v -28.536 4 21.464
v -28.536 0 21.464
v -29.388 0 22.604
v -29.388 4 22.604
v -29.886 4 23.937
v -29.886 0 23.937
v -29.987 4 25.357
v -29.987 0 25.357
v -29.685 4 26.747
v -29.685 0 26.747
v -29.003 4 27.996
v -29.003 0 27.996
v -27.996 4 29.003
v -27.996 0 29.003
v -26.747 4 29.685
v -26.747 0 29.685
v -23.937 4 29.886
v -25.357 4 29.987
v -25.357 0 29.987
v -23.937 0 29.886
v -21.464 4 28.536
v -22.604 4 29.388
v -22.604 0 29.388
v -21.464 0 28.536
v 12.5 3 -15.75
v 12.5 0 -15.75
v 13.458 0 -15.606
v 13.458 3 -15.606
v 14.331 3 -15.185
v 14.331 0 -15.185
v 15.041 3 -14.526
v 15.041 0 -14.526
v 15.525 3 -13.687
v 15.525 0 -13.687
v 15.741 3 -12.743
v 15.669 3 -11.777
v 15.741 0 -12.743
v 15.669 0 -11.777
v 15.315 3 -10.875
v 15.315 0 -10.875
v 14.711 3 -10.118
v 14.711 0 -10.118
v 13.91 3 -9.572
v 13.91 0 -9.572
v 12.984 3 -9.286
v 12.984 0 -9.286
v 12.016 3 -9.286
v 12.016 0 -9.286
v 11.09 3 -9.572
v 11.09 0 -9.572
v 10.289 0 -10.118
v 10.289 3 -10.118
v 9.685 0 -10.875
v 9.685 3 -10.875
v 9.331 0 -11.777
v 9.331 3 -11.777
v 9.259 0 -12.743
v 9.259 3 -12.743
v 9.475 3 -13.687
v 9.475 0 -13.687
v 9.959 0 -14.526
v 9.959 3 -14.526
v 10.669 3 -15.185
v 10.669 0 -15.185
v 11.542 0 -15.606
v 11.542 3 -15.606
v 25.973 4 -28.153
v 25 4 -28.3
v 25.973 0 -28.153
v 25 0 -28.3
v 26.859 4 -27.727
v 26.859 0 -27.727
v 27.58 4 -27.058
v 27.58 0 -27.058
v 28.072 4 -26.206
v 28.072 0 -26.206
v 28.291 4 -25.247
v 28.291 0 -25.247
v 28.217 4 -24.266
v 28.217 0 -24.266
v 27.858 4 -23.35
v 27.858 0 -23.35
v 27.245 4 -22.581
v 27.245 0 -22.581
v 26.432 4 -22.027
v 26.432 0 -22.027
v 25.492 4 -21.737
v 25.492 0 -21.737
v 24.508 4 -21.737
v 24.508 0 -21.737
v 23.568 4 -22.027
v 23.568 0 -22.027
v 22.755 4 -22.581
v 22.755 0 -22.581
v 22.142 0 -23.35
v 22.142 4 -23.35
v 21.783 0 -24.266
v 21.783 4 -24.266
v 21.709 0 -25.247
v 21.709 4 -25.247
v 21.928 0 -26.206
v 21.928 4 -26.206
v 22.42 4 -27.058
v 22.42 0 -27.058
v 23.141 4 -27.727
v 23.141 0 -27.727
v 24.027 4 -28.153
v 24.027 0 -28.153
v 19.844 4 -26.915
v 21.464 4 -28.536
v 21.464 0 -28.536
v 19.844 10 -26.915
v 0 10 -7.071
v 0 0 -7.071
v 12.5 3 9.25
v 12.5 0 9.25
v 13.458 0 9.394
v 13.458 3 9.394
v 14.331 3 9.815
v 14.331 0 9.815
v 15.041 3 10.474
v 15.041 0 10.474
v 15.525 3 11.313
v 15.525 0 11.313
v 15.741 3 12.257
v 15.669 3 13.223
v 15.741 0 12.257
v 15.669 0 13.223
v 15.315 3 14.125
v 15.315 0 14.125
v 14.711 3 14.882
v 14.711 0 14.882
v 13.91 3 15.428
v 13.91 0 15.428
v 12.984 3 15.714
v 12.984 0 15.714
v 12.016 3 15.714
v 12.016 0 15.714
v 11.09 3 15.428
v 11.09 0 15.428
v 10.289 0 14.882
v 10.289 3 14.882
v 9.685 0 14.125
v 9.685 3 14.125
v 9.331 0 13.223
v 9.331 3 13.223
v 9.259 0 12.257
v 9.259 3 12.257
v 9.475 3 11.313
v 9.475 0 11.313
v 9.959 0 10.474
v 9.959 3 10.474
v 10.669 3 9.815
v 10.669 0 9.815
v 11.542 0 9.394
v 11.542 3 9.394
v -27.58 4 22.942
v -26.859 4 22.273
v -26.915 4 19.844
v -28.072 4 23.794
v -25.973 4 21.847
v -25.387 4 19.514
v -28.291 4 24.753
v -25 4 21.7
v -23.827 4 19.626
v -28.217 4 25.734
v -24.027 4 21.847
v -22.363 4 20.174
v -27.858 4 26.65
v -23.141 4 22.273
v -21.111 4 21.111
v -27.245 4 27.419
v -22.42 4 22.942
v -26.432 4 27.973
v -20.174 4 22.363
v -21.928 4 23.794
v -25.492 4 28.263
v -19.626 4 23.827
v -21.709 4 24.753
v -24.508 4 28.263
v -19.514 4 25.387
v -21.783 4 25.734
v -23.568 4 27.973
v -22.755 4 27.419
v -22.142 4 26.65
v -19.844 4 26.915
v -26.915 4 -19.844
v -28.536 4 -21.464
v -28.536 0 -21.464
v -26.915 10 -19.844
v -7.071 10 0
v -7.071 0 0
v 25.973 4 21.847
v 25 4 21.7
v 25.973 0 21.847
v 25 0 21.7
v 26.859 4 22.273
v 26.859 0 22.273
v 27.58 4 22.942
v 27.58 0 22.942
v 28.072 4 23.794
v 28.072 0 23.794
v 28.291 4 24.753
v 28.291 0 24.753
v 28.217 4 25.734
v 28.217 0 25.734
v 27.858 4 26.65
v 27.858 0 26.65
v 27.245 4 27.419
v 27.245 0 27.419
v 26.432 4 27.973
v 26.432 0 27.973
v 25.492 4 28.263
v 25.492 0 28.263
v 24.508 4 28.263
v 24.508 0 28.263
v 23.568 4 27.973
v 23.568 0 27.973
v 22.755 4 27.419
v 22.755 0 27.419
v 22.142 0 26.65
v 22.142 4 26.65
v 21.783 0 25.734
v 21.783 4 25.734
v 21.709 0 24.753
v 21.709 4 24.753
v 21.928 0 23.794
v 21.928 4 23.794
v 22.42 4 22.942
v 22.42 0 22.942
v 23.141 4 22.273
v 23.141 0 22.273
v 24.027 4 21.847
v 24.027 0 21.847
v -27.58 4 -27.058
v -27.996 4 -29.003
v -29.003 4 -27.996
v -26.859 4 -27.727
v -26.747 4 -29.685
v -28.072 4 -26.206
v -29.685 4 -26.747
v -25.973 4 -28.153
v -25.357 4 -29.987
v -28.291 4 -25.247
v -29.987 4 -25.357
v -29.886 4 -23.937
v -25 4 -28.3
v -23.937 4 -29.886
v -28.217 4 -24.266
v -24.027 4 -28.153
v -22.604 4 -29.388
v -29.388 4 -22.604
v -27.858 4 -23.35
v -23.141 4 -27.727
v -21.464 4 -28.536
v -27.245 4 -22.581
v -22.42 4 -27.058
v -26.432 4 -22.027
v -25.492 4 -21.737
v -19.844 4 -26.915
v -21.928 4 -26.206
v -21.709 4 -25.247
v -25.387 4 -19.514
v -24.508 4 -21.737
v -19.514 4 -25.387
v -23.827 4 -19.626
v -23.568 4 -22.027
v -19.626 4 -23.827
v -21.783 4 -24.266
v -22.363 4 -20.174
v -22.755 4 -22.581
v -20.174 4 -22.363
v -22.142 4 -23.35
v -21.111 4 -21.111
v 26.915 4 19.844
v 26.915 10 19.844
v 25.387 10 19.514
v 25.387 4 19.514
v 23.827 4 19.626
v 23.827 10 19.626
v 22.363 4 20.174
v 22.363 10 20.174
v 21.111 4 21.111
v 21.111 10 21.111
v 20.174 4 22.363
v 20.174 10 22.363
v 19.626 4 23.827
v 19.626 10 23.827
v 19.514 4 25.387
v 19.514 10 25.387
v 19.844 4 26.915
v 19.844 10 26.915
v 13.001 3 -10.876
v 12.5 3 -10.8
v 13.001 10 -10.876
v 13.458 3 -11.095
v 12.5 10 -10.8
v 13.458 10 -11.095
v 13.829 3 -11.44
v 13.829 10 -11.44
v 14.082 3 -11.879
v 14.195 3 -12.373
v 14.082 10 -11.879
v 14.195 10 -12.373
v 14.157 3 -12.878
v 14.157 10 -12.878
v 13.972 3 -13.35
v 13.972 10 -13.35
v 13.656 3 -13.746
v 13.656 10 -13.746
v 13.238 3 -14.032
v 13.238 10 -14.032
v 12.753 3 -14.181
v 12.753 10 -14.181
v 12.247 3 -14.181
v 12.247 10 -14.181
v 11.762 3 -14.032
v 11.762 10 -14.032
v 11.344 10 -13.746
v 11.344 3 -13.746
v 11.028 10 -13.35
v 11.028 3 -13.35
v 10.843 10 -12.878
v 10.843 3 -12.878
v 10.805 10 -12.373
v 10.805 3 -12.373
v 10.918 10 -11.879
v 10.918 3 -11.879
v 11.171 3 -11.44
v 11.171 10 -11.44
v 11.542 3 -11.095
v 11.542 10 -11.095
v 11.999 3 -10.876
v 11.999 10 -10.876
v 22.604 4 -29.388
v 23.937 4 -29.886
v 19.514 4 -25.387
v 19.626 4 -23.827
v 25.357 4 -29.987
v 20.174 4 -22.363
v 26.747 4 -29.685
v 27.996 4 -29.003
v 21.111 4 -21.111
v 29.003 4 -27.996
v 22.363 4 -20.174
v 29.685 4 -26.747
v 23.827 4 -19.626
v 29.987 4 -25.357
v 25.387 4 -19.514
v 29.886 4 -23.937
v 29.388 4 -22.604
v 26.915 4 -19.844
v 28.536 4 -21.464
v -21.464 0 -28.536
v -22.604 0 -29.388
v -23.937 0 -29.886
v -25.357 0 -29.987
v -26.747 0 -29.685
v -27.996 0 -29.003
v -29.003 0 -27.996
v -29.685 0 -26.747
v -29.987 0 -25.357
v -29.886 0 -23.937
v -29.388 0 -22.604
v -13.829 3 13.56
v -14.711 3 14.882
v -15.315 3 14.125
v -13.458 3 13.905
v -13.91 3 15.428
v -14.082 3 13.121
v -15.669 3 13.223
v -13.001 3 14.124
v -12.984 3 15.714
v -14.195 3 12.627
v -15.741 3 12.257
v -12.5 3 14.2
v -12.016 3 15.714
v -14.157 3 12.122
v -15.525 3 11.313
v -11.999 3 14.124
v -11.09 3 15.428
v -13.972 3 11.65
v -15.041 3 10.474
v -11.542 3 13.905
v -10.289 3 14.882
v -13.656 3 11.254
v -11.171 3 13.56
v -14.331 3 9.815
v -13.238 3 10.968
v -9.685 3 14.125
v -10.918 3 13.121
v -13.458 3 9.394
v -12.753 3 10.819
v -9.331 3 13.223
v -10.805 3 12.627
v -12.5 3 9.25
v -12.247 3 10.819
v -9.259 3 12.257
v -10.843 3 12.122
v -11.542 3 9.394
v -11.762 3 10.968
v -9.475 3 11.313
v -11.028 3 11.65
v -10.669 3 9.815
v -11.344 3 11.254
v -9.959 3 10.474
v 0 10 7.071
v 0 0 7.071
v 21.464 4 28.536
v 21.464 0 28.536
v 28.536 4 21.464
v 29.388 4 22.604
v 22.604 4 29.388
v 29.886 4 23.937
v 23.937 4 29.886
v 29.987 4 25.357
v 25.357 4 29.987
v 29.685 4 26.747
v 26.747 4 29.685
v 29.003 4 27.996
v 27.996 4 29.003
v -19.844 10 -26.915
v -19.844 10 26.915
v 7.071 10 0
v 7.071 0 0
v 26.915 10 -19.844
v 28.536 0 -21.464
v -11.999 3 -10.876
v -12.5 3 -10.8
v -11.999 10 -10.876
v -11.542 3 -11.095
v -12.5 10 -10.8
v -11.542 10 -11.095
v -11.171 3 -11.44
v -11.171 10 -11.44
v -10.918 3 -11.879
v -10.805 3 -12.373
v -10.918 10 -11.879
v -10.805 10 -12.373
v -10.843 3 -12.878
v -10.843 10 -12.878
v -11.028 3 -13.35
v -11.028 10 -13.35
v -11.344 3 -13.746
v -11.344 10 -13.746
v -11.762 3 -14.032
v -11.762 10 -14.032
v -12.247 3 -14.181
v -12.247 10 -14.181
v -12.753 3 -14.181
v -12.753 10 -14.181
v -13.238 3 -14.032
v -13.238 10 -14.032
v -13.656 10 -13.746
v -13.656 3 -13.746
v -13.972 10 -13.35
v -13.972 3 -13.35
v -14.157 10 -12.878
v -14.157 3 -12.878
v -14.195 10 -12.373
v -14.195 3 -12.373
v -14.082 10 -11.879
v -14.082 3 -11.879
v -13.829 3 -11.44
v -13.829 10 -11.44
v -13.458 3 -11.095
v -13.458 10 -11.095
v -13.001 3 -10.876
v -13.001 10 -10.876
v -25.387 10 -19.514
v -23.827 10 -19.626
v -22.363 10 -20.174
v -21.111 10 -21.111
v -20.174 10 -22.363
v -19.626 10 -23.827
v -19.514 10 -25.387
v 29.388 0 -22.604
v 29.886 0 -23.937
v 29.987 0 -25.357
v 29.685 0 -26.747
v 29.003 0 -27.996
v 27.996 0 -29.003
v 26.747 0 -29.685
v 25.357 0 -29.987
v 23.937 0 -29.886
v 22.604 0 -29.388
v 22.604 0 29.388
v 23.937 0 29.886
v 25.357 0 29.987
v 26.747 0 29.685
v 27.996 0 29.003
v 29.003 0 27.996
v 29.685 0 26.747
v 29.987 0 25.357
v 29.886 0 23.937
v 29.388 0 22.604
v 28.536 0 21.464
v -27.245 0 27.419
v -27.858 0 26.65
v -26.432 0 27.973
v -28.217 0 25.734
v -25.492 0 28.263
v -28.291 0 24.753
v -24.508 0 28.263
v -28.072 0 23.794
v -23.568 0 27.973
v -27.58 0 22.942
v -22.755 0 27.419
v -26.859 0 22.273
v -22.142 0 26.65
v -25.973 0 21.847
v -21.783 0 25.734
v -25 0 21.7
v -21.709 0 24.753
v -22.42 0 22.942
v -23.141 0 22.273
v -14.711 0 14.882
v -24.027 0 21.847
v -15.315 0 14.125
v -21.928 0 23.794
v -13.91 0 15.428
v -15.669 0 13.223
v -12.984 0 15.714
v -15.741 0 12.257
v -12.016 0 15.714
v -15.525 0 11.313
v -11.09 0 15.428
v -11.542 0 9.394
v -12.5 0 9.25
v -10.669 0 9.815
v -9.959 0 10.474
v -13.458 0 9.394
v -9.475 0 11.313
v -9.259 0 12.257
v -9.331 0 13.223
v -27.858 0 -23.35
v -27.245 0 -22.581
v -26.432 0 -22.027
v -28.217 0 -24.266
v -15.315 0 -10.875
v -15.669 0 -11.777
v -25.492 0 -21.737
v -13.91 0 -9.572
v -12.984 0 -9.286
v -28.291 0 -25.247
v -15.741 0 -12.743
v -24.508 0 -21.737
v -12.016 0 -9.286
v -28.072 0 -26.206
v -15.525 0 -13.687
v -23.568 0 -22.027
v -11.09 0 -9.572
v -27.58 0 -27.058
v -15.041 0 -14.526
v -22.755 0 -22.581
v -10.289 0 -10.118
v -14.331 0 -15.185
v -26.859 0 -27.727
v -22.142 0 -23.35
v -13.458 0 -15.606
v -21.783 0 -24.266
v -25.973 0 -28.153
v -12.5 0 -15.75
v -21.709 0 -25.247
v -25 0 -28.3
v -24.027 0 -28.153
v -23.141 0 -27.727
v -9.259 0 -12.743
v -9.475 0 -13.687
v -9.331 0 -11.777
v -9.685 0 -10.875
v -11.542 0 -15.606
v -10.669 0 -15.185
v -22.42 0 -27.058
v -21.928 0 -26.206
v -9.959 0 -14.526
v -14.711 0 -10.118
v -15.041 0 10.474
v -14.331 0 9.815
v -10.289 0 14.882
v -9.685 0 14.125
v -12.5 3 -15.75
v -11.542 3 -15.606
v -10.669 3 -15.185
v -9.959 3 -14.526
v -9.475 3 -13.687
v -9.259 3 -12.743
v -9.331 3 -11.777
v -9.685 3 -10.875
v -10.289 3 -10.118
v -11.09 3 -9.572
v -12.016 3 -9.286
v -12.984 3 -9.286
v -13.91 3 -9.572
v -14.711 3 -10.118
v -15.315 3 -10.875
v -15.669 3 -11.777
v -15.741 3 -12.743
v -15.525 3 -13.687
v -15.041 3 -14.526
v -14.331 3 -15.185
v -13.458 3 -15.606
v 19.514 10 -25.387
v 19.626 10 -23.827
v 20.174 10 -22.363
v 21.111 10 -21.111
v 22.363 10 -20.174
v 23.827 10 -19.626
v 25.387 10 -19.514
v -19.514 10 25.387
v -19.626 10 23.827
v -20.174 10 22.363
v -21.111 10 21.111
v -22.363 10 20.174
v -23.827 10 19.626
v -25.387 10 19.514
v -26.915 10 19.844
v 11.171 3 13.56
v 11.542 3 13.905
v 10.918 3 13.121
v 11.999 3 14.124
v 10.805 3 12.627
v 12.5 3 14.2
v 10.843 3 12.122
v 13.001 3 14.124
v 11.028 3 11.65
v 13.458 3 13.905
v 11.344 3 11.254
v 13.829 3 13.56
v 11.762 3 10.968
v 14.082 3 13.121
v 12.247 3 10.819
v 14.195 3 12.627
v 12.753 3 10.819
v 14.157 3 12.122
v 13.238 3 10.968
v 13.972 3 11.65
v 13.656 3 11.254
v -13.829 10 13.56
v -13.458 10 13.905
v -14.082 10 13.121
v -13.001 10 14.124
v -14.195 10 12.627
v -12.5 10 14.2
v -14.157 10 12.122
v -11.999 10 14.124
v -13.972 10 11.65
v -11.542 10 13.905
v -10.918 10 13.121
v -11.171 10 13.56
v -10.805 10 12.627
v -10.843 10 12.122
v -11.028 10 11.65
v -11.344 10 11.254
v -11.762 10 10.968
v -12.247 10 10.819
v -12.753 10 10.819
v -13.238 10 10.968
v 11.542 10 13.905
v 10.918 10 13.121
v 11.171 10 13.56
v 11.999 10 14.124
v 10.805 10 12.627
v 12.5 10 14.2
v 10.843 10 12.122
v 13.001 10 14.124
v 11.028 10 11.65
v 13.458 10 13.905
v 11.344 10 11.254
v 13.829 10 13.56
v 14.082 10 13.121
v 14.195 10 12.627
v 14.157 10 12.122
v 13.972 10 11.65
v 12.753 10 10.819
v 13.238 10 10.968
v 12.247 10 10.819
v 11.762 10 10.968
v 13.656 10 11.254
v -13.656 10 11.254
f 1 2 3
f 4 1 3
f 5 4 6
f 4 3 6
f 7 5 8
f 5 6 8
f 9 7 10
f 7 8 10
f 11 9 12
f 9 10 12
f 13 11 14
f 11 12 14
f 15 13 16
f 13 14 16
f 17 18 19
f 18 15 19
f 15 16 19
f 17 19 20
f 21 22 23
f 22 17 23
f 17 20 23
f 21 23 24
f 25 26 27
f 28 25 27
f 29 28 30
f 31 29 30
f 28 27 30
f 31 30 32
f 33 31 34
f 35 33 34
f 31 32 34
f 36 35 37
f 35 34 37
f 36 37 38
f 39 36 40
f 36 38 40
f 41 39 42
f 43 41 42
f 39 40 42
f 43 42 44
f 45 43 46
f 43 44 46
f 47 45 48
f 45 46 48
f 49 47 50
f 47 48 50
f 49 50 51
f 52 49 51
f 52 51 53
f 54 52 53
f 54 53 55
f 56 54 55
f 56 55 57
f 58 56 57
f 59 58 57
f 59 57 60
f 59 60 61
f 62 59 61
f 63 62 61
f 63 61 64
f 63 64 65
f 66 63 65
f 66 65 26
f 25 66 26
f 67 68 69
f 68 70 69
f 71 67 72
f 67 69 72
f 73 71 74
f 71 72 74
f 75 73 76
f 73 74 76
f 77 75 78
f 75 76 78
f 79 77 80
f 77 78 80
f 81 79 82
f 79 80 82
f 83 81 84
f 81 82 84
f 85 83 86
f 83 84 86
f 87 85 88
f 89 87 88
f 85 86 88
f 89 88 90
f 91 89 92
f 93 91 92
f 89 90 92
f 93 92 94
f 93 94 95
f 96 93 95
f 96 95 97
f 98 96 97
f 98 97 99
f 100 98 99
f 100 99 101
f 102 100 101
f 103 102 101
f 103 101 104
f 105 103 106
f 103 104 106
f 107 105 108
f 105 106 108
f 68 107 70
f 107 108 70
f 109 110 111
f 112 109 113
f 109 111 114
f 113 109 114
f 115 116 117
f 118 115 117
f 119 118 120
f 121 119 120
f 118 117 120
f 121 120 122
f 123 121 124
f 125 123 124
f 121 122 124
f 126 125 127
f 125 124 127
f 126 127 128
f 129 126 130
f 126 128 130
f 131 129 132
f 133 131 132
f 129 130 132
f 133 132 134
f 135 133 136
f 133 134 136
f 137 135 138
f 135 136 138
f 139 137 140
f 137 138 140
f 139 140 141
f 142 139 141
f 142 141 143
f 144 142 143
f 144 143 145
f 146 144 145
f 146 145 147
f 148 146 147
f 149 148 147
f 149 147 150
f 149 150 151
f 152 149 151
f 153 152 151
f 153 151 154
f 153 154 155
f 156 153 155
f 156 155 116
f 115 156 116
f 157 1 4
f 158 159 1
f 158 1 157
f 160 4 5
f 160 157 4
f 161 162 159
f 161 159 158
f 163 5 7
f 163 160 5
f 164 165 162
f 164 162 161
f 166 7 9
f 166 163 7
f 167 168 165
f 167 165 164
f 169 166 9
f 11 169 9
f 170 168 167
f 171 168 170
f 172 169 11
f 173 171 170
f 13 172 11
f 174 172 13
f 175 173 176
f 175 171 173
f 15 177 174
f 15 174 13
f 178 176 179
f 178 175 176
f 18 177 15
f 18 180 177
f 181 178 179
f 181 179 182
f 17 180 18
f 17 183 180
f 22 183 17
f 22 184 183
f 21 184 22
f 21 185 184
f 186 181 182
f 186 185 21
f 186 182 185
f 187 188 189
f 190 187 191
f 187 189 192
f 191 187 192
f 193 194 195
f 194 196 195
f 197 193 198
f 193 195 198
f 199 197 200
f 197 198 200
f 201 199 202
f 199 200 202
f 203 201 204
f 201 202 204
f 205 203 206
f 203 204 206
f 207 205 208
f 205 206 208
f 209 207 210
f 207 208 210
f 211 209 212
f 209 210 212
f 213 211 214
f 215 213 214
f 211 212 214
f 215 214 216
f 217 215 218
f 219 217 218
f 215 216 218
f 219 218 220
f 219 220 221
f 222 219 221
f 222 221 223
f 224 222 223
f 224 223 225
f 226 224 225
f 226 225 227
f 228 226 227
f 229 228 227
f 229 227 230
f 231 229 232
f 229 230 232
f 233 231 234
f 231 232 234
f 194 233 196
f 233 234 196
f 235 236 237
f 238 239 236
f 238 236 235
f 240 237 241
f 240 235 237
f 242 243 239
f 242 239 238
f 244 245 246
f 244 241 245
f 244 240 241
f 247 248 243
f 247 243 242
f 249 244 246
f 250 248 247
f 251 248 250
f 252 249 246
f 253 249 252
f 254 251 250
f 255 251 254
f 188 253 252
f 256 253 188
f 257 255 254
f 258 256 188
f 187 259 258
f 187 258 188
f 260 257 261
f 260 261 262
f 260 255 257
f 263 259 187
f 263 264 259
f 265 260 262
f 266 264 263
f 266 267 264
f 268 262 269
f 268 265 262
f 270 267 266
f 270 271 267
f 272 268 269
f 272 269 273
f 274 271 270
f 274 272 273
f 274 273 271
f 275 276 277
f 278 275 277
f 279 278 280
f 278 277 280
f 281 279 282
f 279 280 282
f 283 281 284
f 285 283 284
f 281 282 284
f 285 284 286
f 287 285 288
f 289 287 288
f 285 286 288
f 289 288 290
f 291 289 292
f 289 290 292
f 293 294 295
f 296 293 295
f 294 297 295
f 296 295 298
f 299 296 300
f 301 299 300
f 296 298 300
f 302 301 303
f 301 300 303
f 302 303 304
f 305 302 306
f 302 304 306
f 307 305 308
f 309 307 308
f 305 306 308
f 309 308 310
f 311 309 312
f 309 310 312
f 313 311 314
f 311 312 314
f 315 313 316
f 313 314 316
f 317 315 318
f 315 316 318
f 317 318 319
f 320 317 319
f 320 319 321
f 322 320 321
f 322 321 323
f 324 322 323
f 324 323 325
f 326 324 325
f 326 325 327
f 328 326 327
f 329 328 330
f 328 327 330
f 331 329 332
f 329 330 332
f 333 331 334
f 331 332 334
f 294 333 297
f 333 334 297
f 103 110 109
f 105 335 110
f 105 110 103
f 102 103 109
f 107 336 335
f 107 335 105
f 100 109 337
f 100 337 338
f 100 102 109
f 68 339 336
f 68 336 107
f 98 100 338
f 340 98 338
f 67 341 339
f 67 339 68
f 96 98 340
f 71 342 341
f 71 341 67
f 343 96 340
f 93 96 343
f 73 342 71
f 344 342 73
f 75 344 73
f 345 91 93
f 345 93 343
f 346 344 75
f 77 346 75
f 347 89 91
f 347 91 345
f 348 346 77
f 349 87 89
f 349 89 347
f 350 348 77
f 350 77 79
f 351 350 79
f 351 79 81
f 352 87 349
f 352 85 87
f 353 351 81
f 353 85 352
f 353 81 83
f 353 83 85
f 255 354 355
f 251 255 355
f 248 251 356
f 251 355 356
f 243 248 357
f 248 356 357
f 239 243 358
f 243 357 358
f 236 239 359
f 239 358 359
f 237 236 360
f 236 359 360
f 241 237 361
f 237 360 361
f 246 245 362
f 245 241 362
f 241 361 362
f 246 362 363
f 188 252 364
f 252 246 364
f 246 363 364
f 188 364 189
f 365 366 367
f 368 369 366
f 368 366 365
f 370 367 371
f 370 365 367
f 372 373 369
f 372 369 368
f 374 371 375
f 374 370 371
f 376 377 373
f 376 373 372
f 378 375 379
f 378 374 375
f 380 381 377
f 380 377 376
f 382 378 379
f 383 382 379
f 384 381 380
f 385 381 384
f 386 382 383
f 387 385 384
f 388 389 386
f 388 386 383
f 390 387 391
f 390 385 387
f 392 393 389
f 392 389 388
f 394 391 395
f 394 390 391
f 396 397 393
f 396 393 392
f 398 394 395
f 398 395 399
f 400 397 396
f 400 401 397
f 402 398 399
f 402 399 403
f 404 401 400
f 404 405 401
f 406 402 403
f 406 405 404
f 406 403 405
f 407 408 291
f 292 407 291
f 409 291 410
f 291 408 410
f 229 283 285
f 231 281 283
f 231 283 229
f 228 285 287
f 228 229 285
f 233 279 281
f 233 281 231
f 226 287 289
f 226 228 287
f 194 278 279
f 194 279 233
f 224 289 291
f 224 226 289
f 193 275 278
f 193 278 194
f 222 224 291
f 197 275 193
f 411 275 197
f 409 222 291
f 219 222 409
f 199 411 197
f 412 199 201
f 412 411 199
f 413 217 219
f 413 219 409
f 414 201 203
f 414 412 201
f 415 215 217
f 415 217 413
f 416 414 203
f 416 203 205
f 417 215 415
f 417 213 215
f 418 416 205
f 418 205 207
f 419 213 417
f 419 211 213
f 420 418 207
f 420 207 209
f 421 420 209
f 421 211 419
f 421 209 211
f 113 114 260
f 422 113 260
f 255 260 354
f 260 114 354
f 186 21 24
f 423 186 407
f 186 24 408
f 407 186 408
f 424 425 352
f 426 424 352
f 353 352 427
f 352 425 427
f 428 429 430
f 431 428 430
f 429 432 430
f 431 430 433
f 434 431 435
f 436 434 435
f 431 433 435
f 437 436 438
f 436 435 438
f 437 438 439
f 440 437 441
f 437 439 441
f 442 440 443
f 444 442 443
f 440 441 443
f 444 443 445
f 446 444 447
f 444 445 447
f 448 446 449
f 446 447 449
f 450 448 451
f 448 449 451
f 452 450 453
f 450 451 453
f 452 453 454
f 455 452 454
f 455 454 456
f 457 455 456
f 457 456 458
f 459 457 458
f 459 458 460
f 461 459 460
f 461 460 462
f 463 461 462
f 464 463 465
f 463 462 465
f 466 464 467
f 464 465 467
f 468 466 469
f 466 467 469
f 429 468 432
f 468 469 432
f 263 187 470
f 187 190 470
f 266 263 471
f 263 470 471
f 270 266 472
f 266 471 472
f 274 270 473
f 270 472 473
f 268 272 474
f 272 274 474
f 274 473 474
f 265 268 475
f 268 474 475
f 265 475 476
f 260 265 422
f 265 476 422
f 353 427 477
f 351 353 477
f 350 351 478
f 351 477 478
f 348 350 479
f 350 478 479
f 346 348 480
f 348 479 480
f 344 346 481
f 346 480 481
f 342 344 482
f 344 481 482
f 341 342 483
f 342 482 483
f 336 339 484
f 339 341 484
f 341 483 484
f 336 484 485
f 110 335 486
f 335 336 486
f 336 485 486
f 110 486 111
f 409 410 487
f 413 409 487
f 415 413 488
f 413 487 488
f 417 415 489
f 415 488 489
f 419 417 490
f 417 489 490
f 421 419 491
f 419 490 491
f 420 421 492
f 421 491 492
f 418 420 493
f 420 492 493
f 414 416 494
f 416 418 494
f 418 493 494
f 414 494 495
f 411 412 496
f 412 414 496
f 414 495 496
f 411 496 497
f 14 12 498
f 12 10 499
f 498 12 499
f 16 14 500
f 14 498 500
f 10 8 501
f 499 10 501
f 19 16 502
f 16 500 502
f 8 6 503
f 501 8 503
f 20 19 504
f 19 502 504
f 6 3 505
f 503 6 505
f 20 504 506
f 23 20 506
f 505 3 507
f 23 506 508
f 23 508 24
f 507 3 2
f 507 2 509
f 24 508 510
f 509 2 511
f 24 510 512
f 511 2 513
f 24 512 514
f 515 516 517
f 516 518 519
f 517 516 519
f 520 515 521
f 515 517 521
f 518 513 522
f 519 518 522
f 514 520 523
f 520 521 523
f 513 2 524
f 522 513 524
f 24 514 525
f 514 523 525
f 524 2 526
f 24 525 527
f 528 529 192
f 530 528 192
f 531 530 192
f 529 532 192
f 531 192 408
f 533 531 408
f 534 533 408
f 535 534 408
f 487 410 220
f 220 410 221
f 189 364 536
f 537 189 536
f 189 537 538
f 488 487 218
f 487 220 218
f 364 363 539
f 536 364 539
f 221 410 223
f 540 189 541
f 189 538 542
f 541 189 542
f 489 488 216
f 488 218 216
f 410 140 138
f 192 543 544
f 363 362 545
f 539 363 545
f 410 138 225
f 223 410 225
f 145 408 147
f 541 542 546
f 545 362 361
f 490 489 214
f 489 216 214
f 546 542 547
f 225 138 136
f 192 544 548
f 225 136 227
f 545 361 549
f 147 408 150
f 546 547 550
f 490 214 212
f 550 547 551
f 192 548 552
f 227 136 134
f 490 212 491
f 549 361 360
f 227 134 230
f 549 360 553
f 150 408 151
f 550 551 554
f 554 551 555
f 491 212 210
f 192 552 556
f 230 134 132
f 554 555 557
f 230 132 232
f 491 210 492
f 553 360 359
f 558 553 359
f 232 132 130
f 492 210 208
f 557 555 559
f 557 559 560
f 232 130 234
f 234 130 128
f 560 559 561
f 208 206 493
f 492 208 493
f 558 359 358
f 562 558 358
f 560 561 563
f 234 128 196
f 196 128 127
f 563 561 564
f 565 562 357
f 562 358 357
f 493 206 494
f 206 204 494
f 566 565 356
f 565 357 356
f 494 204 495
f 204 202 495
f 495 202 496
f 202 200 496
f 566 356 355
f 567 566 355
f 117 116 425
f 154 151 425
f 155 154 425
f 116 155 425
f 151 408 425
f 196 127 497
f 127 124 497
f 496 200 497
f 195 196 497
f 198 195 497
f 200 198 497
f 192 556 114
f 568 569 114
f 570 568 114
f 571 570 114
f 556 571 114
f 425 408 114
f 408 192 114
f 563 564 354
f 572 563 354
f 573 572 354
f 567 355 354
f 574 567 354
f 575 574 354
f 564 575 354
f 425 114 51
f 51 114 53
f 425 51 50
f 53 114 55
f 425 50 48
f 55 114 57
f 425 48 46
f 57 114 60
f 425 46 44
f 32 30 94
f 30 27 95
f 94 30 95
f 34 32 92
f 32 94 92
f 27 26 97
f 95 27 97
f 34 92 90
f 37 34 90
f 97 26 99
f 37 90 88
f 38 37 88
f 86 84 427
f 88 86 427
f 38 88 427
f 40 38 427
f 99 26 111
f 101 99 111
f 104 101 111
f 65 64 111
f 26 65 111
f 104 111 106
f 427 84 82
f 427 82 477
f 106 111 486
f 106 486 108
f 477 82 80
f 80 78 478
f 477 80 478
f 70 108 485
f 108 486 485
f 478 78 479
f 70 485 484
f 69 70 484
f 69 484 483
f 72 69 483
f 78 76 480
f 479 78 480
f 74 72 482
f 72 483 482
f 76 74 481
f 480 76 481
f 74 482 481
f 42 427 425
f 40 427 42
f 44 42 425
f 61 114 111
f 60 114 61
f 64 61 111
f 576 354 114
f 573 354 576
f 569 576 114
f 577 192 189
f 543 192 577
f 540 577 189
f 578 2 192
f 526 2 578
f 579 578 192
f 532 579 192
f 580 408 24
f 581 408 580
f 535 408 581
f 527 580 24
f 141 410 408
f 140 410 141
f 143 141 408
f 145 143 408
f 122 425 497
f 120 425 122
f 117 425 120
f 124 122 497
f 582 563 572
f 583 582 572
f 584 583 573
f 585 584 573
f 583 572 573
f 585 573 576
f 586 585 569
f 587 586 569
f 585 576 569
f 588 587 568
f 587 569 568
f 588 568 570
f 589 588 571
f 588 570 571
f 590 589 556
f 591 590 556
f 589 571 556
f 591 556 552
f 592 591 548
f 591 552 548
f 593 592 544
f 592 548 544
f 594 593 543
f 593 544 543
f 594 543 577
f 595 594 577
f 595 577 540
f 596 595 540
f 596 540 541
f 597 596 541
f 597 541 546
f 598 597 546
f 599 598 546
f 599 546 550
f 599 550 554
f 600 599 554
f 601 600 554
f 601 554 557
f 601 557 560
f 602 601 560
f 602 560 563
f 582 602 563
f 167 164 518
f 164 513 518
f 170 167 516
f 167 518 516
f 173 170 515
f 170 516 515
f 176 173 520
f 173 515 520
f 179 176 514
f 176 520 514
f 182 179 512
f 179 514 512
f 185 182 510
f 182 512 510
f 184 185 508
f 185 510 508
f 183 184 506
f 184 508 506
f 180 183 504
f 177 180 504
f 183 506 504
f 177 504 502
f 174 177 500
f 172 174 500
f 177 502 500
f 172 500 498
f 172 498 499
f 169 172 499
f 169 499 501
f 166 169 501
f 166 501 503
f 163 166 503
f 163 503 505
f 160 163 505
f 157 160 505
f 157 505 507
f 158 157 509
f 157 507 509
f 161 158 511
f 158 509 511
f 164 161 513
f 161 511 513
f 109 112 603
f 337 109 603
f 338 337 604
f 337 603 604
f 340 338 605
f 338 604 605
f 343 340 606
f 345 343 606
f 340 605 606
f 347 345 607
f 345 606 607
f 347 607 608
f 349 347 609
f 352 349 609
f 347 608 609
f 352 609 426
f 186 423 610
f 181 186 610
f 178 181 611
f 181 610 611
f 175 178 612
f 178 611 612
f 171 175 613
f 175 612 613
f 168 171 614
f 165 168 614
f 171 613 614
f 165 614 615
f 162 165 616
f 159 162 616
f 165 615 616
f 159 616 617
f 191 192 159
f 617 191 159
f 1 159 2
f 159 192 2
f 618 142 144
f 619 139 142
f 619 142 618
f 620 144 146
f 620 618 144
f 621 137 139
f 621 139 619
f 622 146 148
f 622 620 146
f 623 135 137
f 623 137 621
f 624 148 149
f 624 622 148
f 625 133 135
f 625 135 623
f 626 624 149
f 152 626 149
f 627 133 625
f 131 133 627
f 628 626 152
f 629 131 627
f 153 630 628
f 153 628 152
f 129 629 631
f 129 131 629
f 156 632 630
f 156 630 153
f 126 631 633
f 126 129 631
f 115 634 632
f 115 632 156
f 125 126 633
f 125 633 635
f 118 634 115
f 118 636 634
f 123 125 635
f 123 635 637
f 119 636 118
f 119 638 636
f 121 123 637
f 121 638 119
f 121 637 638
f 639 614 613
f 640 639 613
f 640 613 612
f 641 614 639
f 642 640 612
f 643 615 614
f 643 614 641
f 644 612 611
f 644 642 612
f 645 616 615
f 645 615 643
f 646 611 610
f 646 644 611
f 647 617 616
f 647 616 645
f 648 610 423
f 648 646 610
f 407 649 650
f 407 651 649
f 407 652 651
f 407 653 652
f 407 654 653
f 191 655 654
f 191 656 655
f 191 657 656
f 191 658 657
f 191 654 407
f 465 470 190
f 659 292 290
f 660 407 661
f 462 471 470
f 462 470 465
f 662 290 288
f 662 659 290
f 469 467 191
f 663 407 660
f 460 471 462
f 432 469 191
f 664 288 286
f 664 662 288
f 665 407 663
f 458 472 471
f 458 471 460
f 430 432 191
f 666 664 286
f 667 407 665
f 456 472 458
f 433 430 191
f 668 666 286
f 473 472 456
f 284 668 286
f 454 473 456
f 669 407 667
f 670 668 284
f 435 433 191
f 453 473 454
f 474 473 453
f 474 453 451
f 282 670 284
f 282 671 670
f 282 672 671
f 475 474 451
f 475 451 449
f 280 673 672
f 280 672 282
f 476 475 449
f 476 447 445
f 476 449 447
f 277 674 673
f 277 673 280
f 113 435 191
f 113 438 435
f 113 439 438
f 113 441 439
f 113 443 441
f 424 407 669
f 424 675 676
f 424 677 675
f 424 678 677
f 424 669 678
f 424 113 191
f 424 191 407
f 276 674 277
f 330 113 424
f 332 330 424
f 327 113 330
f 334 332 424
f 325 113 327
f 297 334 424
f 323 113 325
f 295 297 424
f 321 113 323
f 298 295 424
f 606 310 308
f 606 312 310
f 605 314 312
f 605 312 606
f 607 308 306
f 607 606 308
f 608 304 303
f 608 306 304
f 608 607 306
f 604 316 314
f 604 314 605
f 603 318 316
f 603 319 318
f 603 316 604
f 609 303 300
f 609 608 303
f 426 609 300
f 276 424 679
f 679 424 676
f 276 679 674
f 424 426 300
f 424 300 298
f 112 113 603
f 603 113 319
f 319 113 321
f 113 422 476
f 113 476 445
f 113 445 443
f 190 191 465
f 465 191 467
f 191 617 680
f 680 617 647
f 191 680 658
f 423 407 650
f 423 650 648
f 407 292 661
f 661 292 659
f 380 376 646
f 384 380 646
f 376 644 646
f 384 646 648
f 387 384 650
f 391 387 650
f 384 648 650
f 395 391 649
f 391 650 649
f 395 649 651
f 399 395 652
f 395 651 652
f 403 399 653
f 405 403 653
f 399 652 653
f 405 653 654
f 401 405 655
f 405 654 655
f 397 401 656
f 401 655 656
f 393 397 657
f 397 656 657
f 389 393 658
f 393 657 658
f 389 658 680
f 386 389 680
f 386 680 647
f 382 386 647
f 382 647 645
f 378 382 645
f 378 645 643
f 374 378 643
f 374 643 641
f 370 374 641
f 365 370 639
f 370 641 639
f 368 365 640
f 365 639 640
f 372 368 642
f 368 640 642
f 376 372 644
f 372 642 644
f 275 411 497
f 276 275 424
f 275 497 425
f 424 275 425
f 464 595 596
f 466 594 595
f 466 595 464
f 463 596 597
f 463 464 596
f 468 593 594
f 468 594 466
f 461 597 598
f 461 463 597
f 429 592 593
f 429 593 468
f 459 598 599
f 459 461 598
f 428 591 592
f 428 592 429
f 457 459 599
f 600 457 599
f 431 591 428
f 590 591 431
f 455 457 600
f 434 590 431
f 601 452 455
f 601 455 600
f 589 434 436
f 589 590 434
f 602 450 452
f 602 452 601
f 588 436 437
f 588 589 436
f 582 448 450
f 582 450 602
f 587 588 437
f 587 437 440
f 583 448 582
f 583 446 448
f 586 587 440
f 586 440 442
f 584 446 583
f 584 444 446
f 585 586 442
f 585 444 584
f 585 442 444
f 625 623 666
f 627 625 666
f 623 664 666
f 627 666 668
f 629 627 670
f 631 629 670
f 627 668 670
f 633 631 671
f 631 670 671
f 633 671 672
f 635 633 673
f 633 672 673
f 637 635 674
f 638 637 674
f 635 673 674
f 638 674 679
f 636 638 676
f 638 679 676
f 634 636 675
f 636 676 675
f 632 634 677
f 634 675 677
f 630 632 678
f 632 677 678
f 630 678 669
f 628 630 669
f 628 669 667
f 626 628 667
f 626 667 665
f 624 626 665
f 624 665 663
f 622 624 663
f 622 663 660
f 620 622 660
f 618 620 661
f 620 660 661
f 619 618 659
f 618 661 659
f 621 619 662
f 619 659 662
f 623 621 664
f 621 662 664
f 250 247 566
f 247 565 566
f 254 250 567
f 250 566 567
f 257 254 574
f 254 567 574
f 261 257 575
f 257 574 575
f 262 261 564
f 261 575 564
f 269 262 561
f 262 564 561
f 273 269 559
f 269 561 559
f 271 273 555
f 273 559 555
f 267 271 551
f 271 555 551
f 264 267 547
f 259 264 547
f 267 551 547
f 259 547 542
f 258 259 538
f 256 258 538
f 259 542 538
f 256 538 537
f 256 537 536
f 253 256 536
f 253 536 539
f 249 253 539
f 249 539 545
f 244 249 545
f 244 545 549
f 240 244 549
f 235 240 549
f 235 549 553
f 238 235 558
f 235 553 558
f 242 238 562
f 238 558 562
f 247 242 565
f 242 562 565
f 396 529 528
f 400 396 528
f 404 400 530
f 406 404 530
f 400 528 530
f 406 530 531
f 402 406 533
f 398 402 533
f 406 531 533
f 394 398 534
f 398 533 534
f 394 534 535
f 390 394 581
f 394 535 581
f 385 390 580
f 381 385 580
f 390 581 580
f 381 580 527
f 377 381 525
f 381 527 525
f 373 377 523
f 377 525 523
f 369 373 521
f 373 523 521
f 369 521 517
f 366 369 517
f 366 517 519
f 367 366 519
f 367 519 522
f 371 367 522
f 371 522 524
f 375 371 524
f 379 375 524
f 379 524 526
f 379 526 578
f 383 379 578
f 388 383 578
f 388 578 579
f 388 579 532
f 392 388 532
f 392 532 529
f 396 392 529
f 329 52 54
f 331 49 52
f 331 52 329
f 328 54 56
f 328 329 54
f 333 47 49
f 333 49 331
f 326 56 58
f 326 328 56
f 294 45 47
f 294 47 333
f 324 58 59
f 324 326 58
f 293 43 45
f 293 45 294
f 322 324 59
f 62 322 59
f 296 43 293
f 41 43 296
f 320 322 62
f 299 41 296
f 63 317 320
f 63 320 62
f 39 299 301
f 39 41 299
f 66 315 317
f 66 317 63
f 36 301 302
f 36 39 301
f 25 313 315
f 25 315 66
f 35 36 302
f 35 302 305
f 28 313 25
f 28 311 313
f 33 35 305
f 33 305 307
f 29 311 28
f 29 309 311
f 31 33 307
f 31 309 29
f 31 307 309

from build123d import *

# Parameters (mm, degrees)
EXTRUDE1_DEPTH                 = 10
CBORE_FOR_M6_SHCS2_D           = 6.6
CBORE_FOR_M6_SHCS2_CBORE_D     = 11
CBORE_FOR_M6_SHCS2_CBORE_DEPTH = 6
LPATTERN1_COUNT                = 2
LPATTERN1_PITCH                = 50
LPATTERN1_COUNT_DIR2           = 2
LPATTERN1_PITCH_DIR2           = 50
CBORE_FOR_M3_SHCS1_D           = 3.4
CBORE_FOR_M3_SHCS1_CBORE_D     = 6.5
CBORE_FOR_M3_SHCS1_CBORE_DEPTH = 3
LPATTERN2_COUNT                = 2
LPATTERN2_PITCH                = 25
LPATTERN2_COUNT_DIR2           = 2
LPATTERN2_PITCH_DIR2           = 25


with BuildPart() as part:
    # Sketch1 → Extrude1 (new body)
    with BuildSketch(Plane(origin=(0, 0, 0), x_dir=(1, 0, 0), z_dir=(0, 1, 0))):
        with BuildLine():
            Line((7.071067812, 0), (28.535533906, 21.464466094))
            ThreePointArc((28.535533906, 21.464466094), (28.535533906, 28.535533906), (21.464466094, 28.535533906))
            Line((21.464466094, 28.535533906), (0, 7.071067812))
            Line((0, 7.071067812), (-21.464466094, 28.535533906))
            ThreePointArc((-21.464466094, 28.535533906), (-28.535533906, 28.535533906), (-28.535533906, 21.464466094))
            Line((-28.535533906, 21.464466094), (-7.071067812, 0))
            Line((-7.071067812, 0), (-28.535533906, -21.464466094))
            ThreePointArc((-28.535533906, -21.464466094), (-28.535533906, -28.535533906), (-21.464466094, -28.535533906))
            Line((-21.464466094, -28.535533906), (0, -7.071067812))
            Line((0, -7.071067812), (21.464466094, -28.535533906))
            ThreePointArc((21.464466094, -28.535533906), (28.535533906, -28.535533906), (28.535533906, -21.464466094))
            Line((28.535533906, -21.464466094), (7.071067812, 0))
        make_face()
    extrude(amount=EXTRUDE1_DEPTH)

    # CBORE for M6 SHCS2 (through all)
    with Locations(Plane(origin=(-25, 10, -25), x_dir=(0, 0, 1), z_dir=(0, 1, 0))):
        with Locations((0, 0)):
            cbore_for_m6_shcs2 = CounterBoreHole(CBORE_FOR_M6_SHCS2_D / 2, CBORE_FOR_M6_SHCS2_CBORE_D / 2, CBORE_FOR_M6_SHCS2_CBORE_DEPTH)

    # LPattern1: CBORE for M6 SHCS2 2 × 2
    with Locations(*[(i * LPATTERN1_PITCH, 0, j * LPATTERN1_PITCH_DIR2) for i in range(LPATTERN1_COUNT) for j in range(LPATTERN1_COUNT_DIR2) if (i, j) != (0, 0)]):
        add(cbore_for_m6_shcs2, mode=Mode.SUBTRACT)

    # CBORE for M3 SHCS1 (through all)
    with Locations(Plane(origin=(-12.5, 0, 12.5), x_dir=(0, 0, -1), z_dir=(0, -1, 0))):
        with Locations((0, 0)):
            cbore_for_m3_shcs1 = CounterBoreHole(CBORE_FOR_M3_SHCS1_D / 2, CBORE_FOR_M3_SHCS1_CBORE_D / 2, CBORE_FOR_M3_SHCS1_CBORE_DEPTH)

    # LPattern2: CBORE for M3 SHCS1 2 × 2
    with Locations(*[(i * LPATTERN2_PITCH, 0, -j * LPATTERN2_PITCH_DIR2) for i in range(LPATTERN2_COUNT) for j in range(LPATTERN2_COUNT_DIR2) if (i, j) != (0, 0)]):
        add(cbore_for_m3_shcs1, mode=Mode.SUBTRACT)


solid = part.part
